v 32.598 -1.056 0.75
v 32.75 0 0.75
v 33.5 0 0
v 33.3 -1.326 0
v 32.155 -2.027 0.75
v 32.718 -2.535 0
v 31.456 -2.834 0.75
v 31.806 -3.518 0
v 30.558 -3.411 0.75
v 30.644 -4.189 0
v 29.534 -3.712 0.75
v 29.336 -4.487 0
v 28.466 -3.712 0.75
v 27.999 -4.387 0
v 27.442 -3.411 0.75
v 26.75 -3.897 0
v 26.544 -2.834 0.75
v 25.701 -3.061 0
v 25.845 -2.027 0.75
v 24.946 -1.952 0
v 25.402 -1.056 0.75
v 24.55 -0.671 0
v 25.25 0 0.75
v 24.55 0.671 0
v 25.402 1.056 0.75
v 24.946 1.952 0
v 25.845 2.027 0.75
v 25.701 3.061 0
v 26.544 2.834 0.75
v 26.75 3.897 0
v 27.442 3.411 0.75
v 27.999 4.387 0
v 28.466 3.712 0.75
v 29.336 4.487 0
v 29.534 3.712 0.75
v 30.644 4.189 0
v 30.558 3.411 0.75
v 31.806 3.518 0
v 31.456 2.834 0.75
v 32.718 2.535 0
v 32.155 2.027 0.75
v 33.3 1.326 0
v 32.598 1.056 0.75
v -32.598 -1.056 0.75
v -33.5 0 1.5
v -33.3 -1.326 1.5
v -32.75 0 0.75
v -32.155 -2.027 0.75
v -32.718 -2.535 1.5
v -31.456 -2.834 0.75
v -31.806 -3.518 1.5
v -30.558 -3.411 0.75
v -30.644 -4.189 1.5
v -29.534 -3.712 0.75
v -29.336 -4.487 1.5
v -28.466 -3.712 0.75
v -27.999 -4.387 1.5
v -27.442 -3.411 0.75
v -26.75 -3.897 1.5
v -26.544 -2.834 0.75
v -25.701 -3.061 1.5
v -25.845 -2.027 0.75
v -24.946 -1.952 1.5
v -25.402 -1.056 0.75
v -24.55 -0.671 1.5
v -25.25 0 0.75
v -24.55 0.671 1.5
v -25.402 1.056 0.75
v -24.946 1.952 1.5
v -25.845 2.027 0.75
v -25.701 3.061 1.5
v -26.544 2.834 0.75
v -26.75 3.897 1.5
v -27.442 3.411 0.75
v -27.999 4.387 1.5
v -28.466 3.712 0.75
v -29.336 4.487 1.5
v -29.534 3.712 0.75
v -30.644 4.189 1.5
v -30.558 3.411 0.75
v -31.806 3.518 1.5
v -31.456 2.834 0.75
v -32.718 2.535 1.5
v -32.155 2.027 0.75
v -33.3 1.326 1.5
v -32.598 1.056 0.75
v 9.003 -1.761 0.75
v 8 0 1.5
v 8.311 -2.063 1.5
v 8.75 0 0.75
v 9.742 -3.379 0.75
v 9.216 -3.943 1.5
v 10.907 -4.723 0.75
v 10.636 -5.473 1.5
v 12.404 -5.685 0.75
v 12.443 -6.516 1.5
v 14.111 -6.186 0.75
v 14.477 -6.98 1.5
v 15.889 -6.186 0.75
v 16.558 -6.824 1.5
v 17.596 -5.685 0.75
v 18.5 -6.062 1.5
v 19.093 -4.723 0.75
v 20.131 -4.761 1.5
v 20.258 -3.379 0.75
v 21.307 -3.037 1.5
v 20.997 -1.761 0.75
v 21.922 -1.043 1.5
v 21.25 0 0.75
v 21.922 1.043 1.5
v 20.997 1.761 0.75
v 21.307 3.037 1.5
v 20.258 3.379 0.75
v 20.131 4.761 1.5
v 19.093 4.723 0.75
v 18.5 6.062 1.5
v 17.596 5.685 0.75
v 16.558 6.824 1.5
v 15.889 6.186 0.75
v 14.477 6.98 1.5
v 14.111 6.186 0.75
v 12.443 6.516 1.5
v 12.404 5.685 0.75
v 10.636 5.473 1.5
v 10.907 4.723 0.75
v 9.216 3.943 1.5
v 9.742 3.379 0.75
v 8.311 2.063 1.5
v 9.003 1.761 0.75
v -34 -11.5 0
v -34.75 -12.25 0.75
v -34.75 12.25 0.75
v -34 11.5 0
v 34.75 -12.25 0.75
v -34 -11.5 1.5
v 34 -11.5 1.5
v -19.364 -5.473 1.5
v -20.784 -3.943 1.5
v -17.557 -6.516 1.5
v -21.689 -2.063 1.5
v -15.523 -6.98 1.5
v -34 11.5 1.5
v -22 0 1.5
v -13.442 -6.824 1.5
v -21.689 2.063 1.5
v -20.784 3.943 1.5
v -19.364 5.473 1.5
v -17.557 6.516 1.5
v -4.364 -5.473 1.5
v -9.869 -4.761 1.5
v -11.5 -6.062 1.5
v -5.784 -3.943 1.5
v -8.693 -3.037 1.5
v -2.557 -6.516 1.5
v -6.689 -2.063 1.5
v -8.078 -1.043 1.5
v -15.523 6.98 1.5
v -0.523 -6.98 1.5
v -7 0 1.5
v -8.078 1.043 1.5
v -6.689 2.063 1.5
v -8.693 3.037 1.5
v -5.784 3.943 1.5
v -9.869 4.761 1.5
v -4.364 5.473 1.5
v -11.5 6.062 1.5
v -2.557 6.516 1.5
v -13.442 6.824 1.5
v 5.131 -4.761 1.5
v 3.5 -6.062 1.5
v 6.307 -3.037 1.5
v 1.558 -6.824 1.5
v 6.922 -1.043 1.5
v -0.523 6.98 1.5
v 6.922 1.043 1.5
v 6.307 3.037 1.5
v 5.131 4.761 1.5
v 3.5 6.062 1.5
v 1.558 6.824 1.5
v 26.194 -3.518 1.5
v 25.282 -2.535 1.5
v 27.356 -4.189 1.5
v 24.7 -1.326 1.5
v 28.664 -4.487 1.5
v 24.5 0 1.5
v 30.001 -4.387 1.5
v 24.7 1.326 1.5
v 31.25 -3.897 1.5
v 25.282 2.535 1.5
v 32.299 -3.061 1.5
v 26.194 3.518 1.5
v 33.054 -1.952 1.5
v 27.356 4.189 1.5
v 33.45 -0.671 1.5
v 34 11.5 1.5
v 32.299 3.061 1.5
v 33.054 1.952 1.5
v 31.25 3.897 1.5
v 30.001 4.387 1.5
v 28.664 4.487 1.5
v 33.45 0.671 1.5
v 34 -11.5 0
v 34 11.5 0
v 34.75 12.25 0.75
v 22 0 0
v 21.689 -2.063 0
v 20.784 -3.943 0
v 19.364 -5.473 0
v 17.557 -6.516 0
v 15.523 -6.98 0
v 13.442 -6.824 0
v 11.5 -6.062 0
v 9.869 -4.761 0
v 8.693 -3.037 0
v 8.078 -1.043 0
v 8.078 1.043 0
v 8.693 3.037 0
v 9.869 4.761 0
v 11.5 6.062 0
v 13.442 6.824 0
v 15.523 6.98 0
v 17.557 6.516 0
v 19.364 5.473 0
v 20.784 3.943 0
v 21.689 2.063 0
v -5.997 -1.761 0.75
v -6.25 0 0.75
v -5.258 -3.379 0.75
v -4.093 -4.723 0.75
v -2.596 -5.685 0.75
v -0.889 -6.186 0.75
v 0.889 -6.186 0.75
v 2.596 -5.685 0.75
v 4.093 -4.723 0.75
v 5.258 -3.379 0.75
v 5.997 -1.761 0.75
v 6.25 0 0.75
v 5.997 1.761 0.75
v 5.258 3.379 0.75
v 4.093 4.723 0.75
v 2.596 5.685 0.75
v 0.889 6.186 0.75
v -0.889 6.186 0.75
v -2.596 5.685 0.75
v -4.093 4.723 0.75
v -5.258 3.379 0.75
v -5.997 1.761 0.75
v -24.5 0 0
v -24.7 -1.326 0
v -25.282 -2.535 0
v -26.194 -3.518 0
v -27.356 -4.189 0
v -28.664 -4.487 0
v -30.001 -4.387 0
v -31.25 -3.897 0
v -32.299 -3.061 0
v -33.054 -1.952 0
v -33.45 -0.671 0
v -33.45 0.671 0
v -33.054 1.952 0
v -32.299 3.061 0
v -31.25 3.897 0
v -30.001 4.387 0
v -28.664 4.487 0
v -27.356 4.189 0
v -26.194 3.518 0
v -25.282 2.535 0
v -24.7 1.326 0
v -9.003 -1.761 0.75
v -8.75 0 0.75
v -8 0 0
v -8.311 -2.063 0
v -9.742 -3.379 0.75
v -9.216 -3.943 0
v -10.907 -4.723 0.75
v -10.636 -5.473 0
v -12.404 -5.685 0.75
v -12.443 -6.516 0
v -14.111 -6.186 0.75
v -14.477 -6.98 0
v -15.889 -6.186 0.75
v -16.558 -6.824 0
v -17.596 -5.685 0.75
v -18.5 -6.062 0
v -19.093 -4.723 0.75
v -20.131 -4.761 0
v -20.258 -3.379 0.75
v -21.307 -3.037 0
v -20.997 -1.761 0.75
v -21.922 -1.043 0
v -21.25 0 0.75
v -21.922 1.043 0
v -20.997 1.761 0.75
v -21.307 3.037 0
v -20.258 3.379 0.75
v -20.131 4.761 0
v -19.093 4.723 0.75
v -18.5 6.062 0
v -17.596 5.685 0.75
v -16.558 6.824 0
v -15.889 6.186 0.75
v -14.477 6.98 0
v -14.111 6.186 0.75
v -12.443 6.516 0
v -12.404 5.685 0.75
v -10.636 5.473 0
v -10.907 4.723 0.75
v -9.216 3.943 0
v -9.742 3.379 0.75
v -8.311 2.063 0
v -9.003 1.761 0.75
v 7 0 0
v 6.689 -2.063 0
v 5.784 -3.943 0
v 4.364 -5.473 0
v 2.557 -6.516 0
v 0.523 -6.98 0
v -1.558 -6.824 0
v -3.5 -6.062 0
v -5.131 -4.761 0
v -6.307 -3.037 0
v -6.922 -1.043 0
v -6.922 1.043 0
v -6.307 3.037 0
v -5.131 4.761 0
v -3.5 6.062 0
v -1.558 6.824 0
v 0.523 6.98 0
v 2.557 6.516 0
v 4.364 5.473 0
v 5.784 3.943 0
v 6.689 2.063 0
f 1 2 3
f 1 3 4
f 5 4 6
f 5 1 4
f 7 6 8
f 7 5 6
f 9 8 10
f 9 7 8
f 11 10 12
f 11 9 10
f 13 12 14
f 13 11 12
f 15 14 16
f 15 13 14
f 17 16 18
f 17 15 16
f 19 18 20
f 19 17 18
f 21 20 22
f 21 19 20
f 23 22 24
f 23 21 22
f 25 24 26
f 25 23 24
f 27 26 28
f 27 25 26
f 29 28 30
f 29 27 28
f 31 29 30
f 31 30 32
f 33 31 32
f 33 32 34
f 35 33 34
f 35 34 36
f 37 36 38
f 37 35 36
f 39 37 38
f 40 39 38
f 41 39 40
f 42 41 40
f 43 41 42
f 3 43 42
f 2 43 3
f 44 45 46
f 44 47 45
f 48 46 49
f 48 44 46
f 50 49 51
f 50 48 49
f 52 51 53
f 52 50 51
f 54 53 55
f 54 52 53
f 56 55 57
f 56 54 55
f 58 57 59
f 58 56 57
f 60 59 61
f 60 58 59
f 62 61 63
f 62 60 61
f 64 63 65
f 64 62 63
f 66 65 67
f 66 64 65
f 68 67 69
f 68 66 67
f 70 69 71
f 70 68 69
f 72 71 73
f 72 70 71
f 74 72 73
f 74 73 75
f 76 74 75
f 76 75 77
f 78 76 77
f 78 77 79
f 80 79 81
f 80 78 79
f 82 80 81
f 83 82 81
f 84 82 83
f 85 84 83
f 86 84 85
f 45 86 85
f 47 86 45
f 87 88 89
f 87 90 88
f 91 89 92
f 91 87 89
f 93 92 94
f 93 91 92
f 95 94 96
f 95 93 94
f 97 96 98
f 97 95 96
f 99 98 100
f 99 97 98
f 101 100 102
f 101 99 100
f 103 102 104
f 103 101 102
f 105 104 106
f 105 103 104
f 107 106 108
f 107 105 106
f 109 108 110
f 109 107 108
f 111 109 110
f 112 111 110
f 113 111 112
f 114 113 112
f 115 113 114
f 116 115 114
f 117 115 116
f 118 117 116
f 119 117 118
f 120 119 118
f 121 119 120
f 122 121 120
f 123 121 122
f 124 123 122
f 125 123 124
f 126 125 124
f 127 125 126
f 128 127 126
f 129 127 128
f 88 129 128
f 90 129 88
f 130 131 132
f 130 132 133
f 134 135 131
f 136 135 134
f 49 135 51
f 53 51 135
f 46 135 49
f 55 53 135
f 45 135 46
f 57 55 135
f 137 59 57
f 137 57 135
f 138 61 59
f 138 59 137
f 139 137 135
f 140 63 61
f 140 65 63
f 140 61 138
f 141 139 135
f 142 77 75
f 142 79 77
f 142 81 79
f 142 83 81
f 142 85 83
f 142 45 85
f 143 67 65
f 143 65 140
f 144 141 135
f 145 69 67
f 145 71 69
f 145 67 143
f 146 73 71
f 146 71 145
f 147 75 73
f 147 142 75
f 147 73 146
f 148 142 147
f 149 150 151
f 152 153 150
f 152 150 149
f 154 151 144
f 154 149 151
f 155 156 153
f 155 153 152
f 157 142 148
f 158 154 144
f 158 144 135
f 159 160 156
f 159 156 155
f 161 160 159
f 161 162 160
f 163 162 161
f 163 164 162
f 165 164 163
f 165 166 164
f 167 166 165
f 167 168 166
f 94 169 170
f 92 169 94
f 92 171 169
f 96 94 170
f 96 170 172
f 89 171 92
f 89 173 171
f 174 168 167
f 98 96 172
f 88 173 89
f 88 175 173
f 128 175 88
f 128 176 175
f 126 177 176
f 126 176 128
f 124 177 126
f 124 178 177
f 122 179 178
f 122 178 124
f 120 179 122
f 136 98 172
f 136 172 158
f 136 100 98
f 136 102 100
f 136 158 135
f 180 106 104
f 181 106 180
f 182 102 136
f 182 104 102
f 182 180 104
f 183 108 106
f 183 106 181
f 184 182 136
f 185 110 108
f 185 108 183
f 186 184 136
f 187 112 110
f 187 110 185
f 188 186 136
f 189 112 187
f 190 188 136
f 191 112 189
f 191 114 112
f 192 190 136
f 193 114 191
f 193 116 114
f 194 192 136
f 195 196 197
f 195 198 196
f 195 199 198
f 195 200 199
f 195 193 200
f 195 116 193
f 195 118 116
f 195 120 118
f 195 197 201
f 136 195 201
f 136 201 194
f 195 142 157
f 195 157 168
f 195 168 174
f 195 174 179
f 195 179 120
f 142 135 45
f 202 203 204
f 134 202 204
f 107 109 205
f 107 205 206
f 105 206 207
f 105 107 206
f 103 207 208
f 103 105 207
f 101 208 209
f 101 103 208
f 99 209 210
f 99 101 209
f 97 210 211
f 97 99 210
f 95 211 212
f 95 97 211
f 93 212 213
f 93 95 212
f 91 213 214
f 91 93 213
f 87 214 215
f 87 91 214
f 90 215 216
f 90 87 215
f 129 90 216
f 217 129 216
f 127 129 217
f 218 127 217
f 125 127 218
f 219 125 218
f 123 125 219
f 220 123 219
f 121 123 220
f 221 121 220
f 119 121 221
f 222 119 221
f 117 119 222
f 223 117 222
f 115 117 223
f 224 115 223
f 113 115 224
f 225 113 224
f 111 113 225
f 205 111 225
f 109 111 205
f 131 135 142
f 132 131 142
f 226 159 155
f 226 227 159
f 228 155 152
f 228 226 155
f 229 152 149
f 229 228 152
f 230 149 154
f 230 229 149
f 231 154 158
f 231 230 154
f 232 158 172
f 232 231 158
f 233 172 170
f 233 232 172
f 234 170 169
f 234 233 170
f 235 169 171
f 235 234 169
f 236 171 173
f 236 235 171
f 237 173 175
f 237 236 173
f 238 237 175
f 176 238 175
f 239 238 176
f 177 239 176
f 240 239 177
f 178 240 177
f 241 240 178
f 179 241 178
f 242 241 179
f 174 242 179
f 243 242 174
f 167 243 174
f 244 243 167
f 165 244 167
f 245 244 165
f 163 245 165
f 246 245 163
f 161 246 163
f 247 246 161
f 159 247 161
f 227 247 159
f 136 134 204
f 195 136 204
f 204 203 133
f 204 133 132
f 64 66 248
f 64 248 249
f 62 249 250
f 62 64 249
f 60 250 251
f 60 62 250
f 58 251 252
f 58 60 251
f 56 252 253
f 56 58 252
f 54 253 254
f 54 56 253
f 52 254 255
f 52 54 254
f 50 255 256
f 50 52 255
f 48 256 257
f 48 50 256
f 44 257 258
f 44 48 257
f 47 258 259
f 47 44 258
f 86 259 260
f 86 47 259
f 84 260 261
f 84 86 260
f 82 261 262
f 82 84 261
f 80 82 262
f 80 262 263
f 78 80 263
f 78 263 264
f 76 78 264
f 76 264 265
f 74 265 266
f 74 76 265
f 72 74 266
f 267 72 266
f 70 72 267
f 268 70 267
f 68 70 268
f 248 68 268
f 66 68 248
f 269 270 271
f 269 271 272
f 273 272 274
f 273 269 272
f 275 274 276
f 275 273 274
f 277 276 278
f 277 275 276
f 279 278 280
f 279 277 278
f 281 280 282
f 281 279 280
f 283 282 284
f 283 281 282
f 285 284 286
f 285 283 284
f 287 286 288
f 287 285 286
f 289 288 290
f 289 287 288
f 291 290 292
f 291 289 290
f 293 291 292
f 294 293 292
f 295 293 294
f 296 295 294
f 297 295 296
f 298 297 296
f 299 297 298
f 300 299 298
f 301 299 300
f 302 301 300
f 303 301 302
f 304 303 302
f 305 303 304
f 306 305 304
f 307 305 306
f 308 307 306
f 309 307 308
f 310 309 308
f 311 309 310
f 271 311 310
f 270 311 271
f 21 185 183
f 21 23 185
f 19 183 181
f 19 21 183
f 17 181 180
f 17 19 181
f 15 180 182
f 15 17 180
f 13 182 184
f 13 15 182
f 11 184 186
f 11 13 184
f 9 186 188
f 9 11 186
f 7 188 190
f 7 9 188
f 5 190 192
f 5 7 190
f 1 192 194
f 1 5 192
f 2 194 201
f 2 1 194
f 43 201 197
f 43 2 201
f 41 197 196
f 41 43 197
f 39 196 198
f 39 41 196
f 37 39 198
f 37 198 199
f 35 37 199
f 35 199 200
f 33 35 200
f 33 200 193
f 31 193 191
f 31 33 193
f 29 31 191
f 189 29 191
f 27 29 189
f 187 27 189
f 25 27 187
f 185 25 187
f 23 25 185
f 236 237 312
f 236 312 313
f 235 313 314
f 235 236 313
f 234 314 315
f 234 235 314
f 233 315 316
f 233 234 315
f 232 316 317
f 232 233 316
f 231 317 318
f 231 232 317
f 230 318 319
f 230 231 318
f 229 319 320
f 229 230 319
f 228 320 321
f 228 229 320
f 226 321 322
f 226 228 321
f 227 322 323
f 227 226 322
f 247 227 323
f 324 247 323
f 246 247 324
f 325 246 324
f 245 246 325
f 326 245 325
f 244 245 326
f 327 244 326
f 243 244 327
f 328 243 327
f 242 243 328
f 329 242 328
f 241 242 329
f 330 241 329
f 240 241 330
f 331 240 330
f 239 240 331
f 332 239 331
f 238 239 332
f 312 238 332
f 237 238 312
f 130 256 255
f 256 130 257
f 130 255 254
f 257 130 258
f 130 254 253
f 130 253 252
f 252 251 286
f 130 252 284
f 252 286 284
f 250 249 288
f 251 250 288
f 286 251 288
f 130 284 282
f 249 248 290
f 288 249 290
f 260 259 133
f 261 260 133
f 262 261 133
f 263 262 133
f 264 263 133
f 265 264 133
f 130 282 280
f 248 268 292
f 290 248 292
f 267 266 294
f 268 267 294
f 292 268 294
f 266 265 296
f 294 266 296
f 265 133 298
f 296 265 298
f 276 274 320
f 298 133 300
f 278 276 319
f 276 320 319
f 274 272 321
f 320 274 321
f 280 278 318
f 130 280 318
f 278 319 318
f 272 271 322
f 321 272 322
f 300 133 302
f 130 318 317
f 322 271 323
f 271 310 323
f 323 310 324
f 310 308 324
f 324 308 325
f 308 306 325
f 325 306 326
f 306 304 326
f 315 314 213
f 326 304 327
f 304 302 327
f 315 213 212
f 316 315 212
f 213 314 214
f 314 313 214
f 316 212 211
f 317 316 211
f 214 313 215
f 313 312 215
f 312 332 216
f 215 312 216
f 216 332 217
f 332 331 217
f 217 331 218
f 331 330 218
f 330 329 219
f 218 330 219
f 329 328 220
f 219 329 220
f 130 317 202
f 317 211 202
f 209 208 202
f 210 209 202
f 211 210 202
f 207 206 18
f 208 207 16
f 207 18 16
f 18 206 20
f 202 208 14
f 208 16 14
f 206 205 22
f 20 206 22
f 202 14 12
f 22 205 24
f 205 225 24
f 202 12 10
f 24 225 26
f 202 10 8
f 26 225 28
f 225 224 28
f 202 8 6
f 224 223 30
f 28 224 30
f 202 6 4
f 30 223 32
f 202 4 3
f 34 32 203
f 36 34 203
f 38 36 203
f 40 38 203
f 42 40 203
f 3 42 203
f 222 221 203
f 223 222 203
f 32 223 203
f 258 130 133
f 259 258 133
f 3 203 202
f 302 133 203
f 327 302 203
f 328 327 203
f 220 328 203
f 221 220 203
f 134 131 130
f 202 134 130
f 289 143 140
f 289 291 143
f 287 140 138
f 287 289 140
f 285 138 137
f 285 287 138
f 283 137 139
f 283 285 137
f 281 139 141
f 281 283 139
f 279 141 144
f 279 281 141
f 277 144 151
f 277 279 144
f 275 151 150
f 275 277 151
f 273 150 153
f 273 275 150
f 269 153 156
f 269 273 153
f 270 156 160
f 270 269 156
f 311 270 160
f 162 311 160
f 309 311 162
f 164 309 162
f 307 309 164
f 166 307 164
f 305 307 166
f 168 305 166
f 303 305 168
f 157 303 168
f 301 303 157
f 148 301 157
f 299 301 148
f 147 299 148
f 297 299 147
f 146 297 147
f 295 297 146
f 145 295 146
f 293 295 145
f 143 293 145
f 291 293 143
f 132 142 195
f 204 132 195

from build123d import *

# Parameters (mm, degrees)
F0_W        = 70
F0_H        = 25
F1_DEPTH    = 1.5
F2_D        = 7
F3_D        = 12
F4_SIZE     = 1
F5_T1_DEPTH = 75.1433659759
F5_T3_DEPTH = 30.1433659759


# Not quite as in the source:
# - a fillet or chamfer that OpenCascade refuses, or shapes differently, is made with other operations: its cross-section is extruded or revolved along the edge and cut away or added


with BuildPart() as f1:
    # F0 (on Top) → F1 (new body)
    with BuildSketch(Plane.XY):
        Rectangle(F0_W, F0_H)
    extrude(amount=F1_DEPTH)

    # F2 (through all)
    with Locations(Plane(origin=(0, 0, 0), x_dir=(1, 0, 0), z_dir=(0, 0, -1))):
        with Locations((-29, 0), (29, 0)):
            Hole(F2_D / 2)

    # F3 (through all)
    with Locations(Plane(origin=(0, 0, 0), x_dir=(1, 0, 0), z_dir=(0, 0, -1))):
        with Locations((-15, 0), (0, 0), (15, 0)):
            Hole(F3_D / 2)

    # F4
    f4_edges = [f1.edges().sort_by_distance(p)[0] for p in [
        (0, -12.5, 1.5),
        (-35, 0, 1.5),
        (35, 0, 1.5),
        (0, 12.5, 1.5),
        (-32.5, 0, 1.5),
        (-21, 0, 1.5),
        (-6, 0, 1.5),
        (9, 0, 1.5),
        (25.5, 0, 1.5),
    ]]
    chamfer(f4_edges, length=F4_SIZE)

    # F5: chamfer of 1 on 9 edges, made by hand

    # F5_s2 → F5_t1 (cut)
    with BuildSketch(Plane.YZ.offset(-37.571682988)):
        Polygon((-12.5, 1), (-11.5, 0), (-12.5, 0), align=None)
        Polygon((11.5, 0), (12.5, 1), (12.5, 0), align=None)
    extrude(amount=F5_T1_DEPTH, mode=Mode.SUBTRACT)

    # F5_s4 → F5_t3 (cut)
    with BuildSketch(Plane.XZ.offset(-15.071682988)):
        Polygon((-35, 1), (-34, 0), (-35, 0), align=None)
        Polygon((34, 0), (35, 1), (35, 0), align=None)
    extrude(amount=F5_T3_DEPTH, mode=Mode.SUBTRACT)

    # F5_s5 → F5_t6 (revolve, cut)
    with BuildSketch(Plane.XZ):
        Polygon((-24.5, 0), (-25.5, 1), (-25.5, 0), align=None)
    revolve(axis=Axis((-29, 0, 0), (0, 0, -1)), mode=Mode.SUBTRACT)

    # F5_s7 → F5_t8 (revolve, cut)
    with BuildSketch(Plane.XZ):
        Polygon((-8, 0), (-9, 1), (-9, 0), align=None)
    revolve(axis=Axis((-15, 0, 0), (0, 0, -1)), mode=Mode.SUBTRACT)

    # F5_s9 → F5_t10 (revolve, cut)
    with BuildSketch(Plane.XZ):
        Polygon((7, 0), (6, 1), (6, 0), align=None)
    revolve(axis=Axis((0, 0, 0), (0, 0, -1)), mode=Mode.SUBTRACT)

    # F5_s11 → F5_t12 (revolve, cut)
    with BuildSketch(Plane.XZ):
        Polygon((22, 0), (21, 1), (21, 0), align=None)
    revolve(axis=Axis((15, 0, 0), (0, 0, -1)), mode=Mode.SUBTRACT)

    # F5_s13 → F5_t14 (revolve, cut)
    with BuildSketch(Plane.XZ):
        Polygon((33.5, 0), (32.5, 1), (32.5, 0), align=None)
    revolve(axis=Axis((29, 0, 0), (0, 0, -1)), mode=Mode.SUBTRACT)


solid = f1.part
